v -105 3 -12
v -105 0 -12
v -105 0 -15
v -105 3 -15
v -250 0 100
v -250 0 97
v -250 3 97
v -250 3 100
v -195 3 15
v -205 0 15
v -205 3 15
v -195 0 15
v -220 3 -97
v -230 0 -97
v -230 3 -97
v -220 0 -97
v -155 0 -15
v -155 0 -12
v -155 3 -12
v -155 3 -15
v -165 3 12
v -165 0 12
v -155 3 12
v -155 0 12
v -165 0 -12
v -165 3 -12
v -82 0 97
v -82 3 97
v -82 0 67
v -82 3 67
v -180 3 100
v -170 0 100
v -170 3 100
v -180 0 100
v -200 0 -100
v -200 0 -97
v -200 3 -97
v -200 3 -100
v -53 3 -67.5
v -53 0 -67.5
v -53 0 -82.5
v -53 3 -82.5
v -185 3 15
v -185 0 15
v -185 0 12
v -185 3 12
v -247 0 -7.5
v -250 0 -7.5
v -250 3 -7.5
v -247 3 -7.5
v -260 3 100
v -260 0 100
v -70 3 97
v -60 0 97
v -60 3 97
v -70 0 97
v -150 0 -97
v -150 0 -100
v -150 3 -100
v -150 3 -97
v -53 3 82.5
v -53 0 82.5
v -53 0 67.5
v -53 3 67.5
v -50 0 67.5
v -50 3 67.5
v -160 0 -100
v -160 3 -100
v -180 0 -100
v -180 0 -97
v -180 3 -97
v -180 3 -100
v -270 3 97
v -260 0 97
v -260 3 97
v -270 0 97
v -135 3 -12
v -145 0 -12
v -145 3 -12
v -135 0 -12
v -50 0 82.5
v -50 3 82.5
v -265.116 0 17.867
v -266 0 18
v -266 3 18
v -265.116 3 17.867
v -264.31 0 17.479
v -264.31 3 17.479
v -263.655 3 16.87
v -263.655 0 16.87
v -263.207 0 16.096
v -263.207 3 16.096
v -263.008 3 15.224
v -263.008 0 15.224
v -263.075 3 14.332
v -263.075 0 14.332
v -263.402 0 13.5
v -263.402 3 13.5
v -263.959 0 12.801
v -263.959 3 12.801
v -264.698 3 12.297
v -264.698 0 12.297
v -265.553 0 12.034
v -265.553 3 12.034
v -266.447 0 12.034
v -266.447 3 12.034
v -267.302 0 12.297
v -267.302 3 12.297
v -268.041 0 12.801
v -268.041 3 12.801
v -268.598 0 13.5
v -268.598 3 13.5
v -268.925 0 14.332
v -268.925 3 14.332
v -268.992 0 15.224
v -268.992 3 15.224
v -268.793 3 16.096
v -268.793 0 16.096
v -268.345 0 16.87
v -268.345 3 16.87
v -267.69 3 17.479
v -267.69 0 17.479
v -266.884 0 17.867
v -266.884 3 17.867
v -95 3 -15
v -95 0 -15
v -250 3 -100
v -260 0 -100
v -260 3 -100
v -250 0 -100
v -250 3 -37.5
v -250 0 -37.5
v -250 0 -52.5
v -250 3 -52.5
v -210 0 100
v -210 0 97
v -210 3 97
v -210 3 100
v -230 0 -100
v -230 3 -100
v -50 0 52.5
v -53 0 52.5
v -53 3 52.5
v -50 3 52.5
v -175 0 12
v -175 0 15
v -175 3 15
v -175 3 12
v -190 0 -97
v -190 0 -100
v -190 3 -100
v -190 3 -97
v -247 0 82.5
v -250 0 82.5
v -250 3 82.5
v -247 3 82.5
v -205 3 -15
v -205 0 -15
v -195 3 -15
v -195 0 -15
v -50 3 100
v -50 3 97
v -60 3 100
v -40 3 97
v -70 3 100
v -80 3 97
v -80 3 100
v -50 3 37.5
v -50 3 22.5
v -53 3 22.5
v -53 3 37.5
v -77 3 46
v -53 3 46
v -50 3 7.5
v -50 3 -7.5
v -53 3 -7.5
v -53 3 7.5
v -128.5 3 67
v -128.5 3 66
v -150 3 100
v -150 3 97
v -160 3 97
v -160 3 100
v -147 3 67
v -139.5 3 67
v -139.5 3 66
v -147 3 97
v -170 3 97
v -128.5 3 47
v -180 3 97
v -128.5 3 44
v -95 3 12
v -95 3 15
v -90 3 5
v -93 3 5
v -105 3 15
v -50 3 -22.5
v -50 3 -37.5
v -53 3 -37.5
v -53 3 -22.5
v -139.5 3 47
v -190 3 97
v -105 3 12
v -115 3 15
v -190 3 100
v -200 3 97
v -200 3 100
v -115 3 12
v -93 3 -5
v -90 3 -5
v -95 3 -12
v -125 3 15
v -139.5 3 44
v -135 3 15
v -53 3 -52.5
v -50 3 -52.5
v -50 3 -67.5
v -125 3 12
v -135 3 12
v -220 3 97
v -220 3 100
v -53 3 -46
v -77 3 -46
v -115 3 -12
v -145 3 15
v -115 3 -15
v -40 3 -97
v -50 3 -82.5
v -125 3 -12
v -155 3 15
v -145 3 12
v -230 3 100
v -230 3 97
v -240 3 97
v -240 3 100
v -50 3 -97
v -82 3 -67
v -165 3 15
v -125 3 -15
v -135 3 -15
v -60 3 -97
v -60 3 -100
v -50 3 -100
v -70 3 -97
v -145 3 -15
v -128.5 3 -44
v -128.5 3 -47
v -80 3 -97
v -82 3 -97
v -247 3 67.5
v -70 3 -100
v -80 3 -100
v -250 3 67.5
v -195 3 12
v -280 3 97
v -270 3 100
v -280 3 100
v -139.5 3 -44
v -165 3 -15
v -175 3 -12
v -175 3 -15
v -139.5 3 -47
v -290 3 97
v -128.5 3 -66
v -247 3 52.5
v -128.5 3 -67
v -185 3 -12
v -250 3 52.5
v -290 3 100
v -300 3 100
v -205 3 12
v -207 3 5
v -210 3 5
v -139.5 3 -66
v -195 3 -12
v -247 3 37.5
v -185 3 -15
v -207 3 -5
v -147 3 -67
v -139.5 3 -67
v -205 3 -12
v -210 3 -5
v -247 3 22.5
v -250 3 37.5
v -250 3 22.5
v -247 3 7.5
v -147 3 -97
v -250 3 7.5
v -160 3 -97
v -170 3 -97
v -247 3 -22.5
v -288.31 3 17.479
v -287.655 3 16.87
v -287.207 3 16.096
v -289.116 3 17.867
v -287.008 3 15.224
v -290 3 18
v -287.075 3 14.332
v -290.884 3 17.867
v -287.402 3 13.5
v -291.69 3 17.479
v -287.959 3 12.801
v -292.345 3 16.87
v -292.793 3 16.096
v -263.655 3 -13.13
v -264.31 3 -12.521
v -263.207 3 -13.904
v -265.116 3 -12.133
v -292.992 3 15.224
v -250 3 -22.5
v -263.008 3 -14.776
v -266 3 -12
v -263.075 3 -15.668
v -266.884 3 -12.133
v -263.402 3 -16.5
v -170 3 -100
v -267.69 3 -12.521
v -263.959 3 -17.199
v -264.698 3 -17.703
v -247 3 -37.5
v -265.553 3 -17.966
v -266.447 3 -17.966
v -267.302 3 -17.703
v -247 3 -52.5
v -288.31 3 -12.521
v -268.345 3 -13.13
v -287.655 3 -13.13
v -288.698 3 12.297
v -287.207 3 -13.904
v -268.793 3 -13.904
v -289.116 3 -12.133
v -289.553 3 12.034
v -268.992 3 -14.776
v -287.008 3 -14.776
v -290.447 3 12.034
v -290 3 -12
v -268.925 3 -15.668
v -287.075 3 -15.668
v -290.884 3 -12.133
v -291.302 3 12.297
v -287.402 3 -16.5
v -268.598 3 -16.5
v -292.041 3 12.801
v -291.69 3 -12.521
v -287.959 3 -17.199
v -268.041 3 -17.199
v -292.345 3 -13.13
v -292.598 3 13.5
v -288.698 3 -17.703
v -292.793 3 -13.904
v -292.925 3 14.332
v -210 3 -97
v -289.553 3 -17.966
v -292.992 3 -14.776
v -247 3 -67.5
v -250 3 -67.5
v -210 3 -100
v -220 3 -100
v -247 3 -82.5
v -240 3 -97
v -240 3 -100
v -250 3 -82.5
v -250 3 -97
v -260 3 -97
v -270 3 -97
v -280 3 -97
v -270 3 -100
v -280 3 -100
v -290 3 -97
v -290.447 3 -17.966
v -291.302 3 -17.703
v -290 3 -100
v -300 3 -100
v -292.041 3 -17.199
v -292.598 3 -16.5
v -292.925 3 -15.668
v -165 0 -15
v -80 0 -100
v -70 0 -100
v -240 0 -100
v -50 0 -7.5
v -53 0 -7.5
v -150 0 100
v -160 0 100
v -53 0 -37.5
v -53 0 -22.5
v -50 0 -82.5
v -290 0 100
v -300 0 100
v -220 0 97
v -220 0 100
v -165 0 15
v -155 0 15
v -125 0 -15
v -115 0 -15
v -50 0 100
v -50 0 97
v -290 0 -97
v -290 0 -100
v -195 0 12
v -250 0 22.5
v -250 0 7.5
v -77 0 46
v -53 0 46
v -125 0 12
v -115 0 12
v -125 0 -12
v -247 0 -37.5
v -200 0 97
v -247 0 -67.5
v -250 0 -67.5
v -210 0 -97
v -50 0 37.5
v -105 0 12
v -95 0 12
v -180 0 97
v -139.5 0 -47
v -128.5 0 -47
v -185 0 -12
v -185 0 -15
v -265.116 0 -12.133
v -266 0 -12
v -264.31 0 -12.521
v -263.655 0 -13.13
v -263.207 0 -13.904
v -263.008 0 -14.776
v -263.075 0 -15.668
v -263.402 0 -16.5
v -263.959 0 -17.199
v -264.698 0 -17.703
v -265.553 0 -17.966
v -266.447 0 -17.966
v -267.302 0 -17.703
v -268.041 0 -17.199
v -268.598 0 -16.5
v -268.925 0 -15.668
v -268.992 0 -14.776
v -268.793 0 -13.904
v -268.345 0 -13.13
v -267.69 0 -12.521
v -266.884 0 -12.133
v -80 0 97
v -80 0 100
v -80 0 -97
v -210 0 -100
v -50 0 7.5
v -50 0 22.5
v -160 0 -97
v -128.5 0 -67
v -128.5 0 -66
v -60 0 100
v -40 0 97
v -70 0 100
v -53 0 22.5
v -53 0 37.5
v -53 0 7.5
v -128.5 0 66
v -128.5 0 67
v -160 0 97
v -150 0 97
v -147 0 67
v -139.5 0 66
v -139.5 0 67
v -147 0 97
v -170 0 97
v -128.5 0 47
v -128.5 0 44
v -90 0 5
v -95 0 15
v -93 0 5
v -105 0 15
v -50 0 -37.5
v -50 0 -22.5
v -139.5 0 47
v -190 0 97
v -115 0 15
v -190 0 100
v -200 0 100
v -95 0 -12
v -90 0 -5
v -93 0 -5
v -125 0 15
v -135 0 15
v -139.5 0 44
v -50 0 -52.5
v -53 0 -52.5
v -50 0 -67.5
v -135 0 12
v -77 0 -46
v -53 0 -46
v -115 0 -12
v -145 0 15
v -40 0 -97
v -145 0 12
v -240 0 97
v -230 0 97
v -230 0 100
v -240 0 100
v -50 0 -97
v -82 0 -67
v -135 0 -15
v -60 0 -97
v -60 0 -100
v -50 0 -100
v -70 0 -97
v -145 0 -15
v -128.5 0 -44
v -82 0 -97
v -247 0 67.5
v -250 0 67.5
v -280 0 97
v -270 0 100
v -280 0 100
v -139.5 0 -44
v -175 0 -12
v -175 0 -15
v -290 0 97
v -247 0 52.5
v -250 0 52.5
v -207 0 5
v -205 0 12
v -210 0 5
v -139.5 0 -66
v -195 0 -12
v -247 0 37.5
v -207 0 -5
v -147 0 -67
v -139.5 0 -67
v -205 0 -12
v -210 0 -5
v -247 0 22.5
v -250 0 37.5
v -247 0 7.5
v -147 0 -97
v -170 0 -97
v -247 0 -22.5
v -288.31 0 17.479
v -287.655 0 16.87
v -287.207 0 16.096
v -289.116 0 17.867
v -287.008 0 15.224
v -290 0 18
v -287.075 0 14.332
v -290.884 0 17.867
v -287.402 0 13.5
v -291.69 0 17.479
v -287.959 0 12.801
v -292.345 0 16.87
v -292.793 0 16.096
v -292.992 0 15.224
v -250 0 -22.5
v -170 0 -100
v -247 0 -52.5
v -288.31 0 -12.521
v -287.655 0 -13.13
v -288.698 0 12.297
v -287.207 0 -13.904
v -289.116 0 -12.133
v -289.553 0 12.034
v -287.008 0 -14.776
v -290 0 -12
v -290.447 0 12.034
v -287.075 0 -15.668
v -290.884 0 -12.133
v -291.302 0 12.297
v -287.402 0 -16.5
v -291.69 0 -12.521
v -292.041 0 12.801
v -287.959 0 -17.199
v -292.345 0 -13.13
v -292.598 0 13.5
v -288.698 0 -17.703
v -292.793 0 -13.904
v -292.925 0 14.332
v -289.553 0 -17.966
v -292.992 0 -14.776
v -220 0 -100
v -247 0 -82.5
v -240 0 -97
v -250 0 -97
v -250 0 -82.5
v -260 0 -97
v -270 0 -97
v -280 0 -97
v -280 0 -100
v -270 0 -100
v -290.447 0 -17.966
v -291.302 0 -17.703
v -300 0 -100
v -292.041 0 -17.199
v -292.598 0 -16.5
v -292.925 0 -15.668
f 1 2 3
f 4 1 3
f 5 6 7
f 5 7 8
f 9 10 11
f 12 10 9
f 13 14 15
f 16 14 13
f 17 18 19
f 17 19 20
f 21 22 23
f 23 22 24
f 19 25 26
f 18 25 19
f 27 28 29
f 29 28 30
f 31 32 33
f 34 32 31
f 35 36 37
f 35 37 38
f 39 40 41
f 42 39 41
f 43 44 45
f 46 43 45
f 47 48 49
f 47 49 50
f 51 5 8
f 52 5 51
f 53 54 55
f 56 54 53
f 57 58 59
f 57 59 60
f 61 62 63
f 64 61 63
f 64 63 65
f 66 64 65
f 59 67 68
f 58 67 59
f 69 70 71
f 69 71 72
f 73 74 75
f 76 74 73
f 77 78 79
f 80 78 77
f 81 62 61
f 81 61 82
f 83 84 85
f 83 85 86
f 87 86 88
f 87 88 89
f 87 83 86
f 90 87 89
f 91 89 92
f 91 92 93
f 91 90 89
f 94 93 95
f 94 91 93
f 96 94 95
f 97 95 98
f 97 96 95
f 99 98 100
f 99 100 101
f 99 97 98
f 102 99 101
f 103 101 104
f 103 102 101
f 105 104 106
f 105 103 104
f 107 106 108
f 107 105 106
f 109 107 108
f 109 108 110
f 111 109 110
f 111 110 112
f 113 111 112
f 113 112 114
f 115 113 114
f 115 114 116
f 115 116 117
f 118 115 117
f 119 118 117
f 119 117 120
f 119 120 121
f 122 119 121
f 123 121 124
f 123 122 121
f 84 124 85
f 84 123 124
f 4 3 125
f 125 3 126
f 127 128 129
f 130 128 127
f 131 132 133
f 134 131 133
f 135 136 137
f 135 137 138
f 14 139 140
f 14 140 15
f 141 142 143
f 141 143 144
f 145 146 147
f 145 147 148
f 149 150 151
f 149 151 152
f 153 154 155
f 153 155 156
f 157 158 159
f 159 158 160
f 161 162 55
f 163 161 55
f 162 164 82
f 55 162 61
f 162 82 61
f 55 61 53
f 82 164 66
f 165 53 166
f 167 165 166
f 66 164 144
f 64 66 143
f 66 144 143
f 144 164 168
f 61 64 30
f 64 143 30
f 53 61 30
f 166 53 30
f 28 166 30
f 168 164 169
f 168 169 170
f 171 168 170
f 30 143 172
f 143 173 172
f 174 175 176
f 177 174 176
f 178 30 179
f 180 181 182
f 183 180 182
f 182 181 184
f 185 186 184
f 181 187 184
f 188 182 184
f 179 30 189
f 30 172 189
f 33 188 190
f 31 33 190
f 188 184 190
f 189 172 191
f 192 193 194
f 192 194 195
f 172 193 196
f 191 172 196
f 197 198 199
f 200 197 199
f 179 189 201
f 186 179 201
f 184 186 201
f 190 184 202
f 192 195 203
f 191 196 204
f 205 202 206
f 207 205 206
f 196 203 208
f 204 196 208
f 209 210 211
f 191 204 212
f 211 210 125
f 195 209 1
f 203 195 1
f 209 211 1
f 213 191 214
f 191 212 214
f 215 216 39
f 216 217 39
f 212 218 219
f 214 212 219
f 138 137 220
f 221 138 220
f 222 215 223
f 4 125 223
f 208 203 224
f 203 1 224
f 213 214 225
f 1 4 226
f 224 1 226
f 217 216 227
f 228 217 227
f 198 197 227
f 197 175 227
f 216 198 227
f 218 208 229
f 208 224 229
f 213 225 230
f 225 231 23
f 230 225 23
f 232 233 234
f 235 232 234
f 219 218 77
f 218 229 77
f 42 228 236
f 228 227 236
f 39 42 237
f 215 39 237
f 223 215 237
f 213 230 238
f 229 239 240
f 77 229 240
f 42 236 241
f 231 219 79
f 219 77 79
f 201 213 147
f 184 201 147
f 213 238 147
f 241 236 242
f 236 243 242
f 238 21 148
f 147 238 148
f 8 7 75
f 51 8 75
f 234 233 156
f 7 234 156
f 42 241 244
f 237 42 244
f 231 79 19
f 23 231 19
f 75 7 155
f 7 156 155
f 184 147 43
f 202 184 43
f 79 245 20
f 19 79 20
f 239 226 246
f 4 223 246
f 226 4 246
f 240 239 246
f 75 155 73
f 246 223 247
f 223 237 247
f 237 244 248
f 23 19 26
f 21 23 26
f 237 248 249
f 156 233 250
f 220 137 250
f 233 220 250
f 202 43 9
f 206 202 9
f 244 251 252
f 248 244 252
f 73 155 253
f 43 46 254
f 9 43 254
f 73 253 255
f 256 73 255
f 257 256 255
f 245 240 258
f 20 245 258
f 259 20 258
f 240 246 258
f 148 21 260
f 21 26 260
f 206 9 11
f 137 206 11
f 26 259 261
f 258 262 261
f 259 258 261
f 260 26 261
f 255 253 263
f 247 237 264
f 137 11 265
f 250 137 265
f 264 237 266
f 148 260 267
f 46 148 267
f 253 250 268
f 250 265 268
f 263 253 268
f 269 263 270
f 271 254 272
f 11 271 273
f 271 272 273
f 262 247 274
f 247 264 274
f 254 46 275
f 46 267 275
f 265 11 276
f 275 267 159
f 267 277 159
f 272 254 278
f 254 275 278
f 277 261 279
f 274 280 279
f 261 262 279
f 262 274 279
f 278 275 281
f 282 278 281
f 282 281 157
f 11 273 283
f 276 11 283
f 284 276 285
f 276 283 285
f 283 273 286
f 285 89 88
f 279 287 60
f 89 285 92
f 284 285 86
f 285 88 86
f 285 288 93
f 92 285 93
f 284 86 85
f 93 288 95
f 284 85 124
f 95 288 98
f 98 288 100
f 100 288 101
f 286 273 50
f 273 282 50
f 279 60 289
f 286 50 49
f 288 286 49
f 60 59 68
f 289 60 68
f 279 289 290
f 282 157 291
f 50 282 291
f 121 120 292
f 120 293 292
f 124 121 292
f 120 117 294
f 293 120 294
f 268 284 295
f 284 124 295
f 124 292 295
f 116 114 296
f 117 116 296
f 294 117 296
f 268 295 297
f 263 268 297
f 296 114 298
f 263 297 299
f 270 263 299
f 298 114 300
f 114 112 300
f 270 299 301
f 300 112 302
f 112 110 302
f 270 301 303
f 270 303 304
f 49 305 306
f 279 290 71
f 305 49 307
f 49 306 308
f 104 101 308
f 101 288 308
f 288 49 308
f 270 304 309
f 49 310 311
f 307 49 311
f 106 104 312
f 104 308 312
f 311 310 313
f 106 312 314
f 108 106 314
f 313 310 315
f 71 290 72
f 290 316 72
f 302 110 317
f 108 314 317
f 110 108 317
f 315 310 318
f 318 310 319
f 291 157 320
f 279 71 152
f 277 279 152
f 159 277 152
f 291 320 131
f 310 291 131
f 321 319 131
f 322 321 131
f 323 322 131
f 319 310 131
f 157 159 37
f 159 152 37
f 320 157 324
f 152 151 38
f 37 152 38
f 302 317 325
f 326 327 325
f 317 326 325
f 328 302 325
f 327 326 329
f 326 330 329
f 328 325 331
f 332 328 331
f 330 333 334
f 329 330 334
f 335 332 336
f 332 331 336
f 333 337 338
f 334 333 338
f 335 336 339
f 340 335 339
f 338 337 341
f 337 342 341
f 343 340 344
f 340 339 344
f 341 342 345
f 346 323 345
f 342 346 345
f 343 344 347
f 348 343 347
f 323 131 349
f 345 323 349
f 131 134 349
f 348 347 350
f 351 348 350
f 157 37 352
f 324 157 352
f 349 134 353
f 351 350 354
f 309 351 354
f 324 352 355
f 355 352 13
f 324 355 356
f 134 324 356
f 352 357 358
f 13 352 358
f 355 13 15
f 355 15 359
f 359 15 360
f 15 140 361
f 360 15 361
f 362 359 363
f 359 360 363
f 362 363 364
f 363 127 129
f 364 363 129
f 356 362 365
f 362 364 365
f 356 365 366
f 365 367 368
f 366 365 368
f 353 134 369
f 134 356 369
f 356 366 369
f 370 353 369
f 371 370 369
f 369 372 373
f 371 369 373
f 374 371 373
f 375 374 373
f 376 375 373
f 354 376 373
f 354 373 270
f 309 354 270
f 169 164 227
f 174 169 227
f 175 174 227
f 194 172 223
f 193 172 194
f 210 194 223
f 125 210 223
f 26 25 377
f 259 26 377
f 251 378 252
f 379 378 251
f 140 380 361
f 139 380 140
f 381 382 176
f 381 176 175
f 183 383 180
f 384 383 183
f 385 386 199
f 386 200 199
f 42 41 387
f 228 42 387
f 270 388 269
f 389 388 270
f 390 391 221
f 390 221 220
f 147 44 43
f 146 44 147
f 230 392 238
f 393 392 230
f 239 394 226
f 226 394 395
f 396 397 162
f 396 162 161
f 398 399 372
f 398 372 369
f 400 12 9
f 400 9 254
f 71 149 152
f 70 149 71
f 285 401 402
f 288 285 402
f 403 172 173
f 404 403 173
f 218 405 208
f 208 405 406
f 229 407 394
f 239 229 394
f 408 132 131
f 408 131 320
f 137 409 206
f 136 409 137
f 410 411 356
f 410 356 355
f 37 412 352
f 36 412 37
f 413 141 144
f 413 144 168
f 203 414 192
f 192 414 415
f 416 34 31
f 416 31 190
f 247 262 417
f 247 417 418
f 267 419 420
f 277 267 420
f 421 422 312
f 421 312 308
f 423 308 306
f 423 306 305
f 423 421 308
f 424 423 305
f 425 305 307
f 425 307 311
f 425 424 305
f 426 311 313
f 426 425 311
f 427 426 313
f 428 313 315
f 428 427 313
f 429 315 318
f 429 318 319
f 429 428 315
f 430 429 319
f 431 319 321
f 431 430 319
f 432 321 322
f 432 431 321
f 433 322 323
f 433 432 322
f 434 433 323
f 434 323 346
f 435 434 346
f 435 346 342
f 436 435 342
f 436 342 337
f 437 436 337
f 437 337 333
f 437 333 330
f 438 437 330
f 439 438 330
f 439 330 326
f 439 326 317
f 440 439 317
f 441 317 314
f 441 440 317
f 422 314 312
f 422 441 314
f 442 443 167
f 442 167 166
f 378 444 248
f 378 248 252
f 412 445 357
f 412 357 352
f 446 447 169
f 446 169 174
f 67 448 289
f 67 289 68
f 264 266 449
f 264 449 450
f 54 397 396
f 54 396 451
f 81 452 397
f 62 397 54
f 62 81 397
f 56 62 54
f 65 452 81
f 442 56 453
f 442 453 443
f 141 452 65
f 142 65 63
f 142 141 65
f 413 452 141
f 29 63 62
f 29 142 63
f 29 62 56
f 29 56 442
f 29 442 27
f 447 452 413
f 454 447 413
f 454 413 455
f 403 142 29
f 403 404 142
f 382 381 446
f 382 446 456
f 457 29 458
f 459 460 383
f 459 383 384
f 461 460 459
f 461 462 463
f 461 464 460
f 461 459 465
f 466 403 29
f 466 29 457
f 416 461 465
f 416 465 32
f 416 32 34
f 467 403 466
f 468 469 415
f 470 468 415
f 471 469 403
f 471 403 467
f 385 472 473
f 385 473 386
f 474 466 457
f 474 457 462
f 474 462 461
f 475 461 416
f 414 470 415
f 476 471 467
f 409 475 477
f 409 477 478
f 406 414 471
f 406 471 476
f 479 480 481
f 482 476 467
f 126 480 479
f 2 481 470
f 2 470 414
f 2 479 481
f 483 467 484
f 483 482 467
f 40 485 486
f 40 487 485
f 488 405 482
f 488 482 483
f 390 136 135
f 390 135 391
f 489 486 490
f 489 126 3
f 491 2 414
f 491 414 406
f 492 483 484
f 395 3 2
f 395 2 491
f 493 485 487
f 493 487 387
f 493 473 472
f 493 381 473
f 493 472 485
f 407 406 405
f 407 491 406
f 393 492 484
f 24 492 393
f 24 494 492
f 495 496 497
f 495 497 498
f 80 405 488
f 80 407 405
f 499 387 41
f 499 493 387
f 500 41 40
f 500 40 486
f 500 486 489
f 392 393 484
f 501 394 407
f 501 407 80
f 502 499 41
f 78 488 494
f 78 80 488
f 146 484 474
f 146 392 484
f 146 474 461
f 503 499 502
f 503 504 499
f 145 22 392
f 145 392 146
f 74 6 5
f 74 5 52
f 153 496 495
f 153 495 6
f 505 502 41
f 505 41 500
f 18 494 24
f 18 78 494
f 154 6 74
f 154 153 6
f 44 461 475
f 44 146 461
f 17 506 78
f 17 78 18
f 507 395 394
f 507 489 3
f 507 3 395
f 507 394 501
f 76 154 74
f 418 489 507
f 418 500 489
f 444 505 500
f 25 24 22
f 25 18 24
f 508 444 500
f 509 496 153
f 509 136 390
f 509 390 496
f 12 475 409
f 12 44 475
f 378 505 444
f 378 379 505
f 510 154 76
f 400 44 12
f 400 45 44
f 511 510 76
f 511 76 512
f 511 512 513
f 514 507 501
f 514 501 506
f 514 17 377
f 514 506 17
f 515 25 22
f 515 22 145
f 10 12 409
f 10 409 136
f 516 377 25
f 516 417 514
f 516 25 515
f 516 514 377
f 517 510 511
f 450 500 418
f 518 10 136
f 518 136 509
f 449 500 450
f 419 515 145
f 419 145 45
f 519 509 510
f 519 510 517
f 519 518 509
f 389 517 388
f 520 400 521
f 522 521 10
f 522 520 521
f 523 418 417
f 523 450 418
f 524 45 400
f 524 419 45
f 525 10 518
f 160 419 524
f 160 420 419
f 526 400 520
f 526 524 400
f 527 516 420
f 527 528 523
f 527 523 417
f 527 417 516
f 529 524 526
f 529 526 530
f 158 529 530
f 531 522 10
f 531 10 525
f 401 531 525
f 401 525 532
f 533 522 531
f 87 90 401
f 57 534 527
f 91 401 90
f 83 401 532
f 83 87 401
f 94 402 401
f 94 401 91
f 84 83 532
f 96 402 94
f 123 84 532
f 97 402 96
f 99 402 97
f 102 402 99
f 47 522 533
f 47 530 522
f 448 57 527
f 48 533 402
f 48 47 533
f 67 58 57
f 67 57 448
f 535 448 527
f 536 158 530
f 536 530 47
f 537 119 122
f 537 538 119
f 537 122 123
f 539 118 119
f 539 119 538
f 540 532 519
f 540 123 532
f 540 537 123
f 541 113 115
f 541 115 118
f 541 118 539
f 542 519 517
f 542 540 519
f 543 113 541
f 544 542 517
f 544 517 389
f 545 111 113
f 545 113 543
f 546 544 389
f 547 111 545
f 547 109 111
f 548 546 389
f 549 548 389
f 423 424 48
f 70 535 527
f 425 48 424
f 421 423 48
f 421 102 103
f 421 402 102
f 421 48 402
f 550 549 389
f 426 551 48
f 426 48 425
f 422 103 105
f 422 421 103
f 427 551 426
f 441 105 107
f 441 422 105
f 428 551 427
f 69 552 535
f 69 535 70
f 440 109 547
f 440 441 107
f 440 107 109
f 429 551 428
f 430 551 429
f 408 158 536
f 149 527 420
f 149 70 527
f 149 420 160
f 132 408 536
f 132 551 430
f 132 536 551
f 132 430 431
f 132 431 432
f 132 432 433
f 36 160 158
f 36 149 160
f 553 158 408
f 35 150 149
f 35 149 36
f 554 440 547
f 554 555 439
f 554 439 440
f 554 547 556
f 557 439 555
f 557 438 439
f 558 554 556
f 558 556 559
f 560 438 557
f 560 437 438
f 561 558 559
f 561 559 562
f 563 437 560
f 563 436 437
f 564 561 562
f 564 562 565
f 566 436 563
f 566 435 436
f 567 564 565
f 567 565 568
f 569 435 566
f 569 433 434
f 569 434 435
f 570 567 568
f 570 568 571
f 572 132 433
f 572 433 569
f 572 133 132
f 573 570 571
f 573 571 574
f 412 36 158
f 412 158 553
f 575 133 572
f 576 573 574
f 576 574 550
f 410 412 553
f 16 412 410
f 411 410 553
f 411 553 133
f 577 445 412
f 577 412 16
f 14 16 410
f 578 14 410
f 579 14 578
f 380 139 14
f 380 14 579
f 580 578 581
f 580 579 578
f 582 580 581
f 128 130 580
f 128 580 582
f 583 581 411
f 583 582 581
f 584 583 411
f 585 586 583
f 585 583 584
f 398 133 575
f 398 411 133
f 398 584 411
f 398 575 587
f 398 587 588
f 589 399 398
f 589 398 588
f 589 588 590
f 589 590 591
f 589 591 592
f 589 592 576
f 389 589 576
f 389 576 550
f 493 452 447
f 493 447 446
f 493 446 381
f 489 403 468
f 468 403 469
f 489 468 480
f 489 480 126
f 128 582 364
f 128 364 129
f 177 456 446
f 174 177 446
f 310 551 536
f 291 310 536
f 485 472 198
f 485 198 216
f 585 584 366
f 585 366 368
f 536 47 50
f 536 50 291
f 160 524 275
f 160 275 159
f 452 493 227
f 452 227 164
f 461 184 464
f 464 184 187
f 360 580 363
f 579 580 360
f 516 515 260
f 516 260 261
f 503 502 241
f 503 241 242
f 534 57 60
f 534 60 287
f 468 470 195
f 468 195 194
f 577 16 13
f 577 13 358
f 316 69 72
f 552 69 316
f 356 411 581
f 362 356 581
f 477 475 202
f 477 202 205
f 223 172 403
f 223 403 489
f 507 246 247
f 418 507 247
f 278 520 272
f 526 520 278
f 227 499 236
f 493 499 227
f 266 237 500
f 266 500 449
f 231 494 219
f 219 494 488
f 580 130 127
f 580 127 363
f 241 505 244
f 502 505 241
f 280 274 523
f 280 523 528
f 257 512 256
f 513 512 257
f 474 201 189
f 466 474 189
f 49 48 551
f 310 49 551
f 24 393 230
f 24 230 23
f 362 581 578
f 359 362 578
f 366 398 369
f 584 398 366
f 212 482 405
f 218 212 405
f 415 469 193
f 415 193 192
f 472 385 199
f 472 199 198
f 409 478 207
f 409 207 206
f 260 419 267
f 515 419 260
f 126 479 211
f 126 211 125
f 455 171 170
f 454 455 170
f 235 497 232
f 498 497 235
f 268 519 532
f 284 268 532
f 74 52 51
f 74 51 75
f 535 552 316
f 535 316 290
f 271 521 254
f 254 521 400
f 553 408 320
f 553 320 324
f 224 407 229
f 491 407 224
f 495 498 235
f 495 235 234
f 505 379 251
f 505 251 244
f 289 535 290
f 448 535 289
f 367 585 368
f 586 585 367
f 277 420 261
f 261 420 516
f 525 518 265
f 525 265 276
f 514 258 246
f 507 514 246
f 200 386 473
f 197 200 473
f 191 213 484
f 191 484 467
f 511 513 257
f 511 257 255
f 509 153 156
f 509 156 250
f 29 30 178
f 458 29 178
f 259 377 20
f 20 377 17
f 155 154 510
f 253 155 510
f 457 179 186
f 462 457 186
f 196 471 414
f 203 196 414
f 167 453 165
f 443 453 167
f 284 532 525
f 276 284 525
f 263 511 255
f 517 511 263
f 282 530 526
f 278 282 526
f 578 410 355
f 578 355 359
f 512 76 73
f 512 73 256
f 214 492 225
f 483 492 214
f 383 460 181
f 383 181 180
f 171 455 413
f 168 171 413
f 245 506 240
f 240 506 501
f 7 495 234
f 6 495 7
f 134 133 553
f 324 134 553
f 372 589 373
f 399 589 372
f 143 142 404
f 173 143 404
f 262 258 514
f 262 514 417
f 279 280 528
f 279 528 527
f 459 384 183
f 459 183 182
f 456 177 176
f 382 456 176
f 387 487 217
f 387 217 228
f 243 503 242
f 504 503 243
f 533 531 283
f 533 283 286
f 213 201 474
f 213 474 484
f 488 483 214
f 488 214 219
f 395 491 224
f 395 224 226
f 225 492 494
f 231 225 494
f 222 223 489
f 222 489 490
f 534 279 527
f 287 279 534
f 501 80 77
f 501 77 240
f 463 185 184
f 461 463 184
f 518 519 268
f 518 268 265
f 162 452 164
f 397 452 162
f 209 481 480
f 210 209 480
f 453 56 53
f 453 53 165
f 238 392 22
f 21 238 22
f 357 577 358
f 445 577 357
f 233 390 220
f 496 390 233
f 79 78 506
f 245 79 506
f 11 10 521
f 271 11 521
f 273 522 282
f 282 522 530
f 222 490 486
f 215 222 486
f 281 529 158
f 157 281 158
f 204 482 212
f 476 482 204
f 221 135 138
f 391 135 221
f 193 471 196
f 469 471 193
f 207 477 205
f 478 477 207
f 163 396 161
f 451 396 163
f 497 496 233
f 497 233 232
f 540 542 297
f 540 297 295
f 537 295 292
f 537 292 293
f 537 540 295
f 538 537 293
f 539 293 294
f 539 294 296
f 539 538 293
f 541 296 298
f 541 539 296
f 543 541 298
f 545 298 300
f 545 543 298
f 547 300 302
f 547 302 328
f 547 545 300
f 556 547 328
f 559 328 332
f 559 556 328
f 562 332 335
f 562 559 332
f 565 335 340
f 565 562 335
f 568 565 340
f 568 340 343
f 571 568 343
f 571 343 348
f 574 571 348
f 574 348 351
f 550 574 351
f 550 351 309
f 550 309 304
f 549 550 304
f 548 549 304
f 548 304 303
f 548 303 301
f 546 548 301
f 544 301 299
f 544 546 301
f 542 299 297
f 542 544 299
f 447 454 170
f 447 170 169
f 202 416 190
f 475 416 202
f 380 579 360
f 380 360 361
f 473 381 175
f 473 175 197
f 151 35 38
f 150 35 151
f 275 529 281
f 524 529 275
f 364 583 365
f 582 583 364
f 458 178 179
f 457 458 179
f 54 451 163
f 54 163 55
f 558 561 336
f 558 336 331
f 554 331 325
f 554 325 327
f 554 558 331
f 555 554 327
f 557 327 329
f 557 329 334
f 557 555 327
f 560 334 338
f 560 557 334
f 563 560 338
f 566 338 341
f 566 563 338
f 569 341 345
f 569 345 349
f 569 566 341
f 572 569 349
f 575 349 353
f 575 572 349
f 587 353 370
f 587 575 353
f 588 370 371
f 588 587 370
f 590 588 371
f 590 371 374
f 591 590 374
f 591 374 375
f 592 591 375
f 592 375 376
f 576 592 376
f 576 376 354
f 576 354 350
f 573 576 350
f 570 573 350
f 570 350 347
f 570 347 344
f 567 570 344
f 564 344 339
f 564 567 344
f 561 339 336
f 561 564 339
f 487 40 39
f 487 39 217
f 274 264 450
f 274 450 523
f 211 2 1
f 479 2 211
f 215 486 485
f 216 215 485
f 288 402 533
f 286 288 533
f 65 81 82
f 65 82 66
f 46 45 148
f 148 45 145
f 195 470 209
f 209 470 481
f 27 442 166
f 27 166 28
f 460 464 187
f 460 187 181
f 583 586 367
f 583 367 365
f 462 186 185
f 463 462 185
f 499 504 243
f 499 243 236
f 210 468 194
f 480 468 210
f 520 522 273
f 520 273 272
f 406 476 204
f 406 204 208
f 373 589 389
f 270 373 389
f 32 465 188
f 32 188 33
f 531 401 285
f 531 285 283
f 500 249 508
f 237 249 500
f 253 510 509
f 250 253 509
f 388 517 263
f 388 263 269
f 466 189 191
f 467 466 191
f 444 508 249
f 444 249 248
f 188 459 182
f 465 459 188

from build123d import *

# Parameters (mm, degrees)
SKETCH3_R           = 3
SKETCH3_W           = 3
SKETCH3_H           = 15
SKETCH3_W_2         = 10
SKETCH3_H_2         = 3
SKETCH3_H_3         = 10
BOSS_EXTRUDE1_DEPTH = 3
SKETCH4_W           = 24
SKETCH4_H           = 92
CUT_EXTRUDE1_DEPTH  = 10
SKETCH5_W           = 11
SKETCH5_H           = 3
CUT_EXTRUDE2_DEPTH  = 10


with BuildPart() as part:
    # Sketch3 → Boss-Extrude1 (new body)
    with BuildSketch(Plane(origin=(0, 0, 0), x_dir=(1, 0, 0), z_dir=(0, 1, 0))):
        Polygon((-300, -97), (-300, 97), (-300, 100), (-290, 100), (-290, 97), (-280, 97), (-280, 100), (-270, 100), (-270, 97), (-260, 97), (-260, 100), (-250, 100), (-250, 97), (-240, 97), (-240, 100), (-230, 100), (-230, 97), (-220, 97), (-220, 100), (-210, 100), (-210, 97), (-200, 97), (-200, 100), (-190, 100), (-190, 97), (-180, 97), (-180, 100), (-170, 100), (-170, 97), (-160, 97), (-160, 100), (-150, 100), (-150, 97), (-140, 97), (-140, 100), (-130, 100), (-130, 97), (-120, 97), (-120, 100), (-110, 100), (-110, 97), (-100, 97), (-100, 100), (-90, 100), (-90, 97), (-80, 97), (-80, 100), (-70, 100), (-70, 97), (-60, 97), (-60, 100), (-50, 100), (-50, 97), (-40, 97), (-40, -97), (-50, -97), (-50, -100), (-60, -100), (-60, -97), (-70, -97), (-70, -100), (-80, -100), (-80, -97), (-90, -97), (-90, -100), (-100, -100), (-100, -97), (-110, -97), (-110, -100), (-120, -100), (-120, -97), (-130, -97), (-130, -100), (-140, -100), (-140, -97), (-150, -97), (-150, -100), (-160, -100), (-160, -97), (-170, -97), (-170, -100), (-180, -100), (-180, -97), (-190, -97), (-190, -100), (-200, -100), (-200, -97), (-210, -97), (-210, -100), (-220, -100), (-220, -97), (-230, -97), (-230, -100), (-240, -100), (-240, -97), (-250, -97), (-250, -100), (-260, -100), (-260, -97), (-270, -97), (-270, -100), (-280, -100), (-280, -97), (-290, -97), (-290, -100), (-300, -100), align=None)
        with Locations(Location((-290, 15, 0), (0, 0, 270))):
            Circle(SKETCH3_R, mode=Mode.SUBTRACT)
        with Locations(Location((-266, 15, 0), (0, 0, 270))):
            Circle(SKETCH3_R, mode=Mode.SUBTRACT)
        with Locations(Location((-266, -15, 0), (0, 0, 270))):
            Circle(SKETCH3_R, mode=Mode.SUBTRACT)
        with Locations(Location((-290, -15, 0), (0, 0, 270))):
            Circle(SKETCH3_R, mode=Mode.SUBTRACT)
        with Locations((-51.5, 45)):
            Rectangle(SKETCH3_W, SKETCH3_H, mode=Mode.SUBTRACT)
        with Locations((-51.5, 15)):
            Rectangle(SKETCH3_W, SKETCH3_H, mode=Mode.SUBTRACT)
        with Locations((-248.5, 45)):
            Rectangle(SKETCH3_W, SKETCH3_H, mode=Mode.SUBTRACT)
        with Locations((-248.5, 15)):
            Rectangle(SKETCH3_W, SKETCH3_H, mode=Mode.SUBTRACT)
        with Locations((-51.5, 75)):
            Rectangle(SKETCH3_W, SKETCH3_H, mode=Mode.SUBTRACT)
        with Locations((-51.5, -75)):
            Rectangle(SKETCH3_W, SKETCH3_H, mode=Mode.SUBTRACT)
        with Locations((-120, 13.5)):
            Rectangle(SKETCH3_W_2, SKETCH3_H_2, mode=Mode.SUBTRACT)
        with Locations((-91.5, 0)):
            Rectangle(SKETCH3_W, SKETCH3_H_3, mode=Mode.SUBTRACT)
        with Locations((-100, 13.5)):
            Rectangle(SKETCH3_W_2, SKETCH3_H_2, mode=Mode.SUBTRACT)
        with Locations((-140, 13.5)):
            Rectangle(SKETCH3_W_2, SKETCH3_H_2, mode=Mode.SUBTRACT)
        with Locations((-160, 13.5)):
            Rectangle(SKETCH3_W_2, SKETCH3_H_2, mode=Mode.SUBTRACT)
        with Locations((-180, 13.5)):
            Rectangle(SKETCH3_W_2, SKETCH3_H_2, mode=Mode.SUBTRACT)
        with Locations((-200, 13.5)):
            Rectangle(SKETCH3_W_2, SKETCH3_H_2, mode=Mode.SUBTRACT)
        with Locations((-208.5, 0)):
            Rectangle(SKETCH3_W, SKETCH3_H_3, mode=Mode.SUBTRACT)
        with Locations((-120, -13.5)):
            Rectangle(SKETCH3_W_2, SKETCH3_H_2, mode=Mode.SUBTRACT)
        with Locations((-140, -13.5)):
            Rectangle(SKETCH3_W_2, SKETCH3_H_2, mode=Mode.SUBTRACT)
        with Locations((-160, -13.5)):
            Rectangle(SKETCH3_W_2, SKETCH3_H_2, mode=Mode.SUBTRACT)
        with Locations((-180, -13.5)):
            Rectangle(SKETCH3_W_2, SKETCH3_H_2, mode=Mode.SUBTRACT)
        with Locations((-200, -13.5)):
            Rectangle(SKETCH3_W_2, SKETCH3_H_2, mode=Mode.SUBTRACT)
        with Locations((-100, -13.5)):
            Rectangle(SKETCH3_W_2, SKETCH3_H_2, mode=Mode.SUBTRACT)
        with Locations((-248.5, 75)):
            Rectangle(SKETCH3_W, SKETCH3_H, mode=Mode.SUBTRACT)
        with Locations((-248.5, -75)):
            Rectangle(SKETCH3_W, SKETCH3_H, mode=Mode.SUBTRACT)
        with Locations((-248.5, -45)):
            Rectangle(SKETCH3_W, SKETCH3_H, mode=Mode.SUBTRACT)
        with Locations((-248.5, -15)):
            Rectangle(SKETCH3_W, SKETCH3_H, mode=Mode.SUBTRACT)
        with Locations((-51.5, -45)):
            Rectangle(SKETCH3_W, SKETCH3_H, mode=Mode.SUBTRACT)
        with Locations((-51.5, -15)):
            Rectangle(SKETCH3_W, SKETCH3_H, mode=Mode.SUBTRACT)
    extrude(amount=BOSS_EXTRUDE1_DEPTH)

    # Sketch4 → Cut-Extrude1 (cut)
    with BuildSketch(Plane(origin=(0, 3, 0), x_dir=(1, 0, 0), z_dir=(0, 1, 0))):
        with Locations((-65, 0)):
            Rectangle(SKETCH4_W, SKETCH4_H)
    extrude(amount=-CUT_EXTRUDE1_DEPTH, mode=Mode.SUBTRACT)

    # Sketch5 → Cut-Extrude2 (cut)
    with BuildSketch(Plane(origin=(0, 3, 0), x_dir=(1, 0, 0), z_dir=(0, 1, 0))):
        Polygon((-82, 67), (-128.5, 67), (-128.5, 66), (-139.5, 66), (-139.5, 67), (-147, 67), (-147, 97), (-82, 97), align=None)
        Polygon((-147, -67), (-147, -97), (-82, -97), (-82, -67), (-128.5, -67), (-128.5, -66), (-139.5, -66), (-139.5, -67), align=None)
        with Locations((-134, -45.5)):
            Rectangle(SKETCH5_W, SKETCH5_H)
        with Locations((-134, 45.5)):
            Rectangle(SKETCH5_W, SKETCH5_H)
    extrude(amount=-CUT_EXTRUDE2_DEPTH, mode=Mode.SUBTRACT)


with BuildPart() as cut_extrude2_kept_piece:
    # of the separate pieces the step leaves, the one the design keeps (cut_extrude2_pieces_kept)
    add(part.part.solids().sort_by_distance((-300, 0, 100))[0])


solid = cut_extrude2_kept_piece.part
